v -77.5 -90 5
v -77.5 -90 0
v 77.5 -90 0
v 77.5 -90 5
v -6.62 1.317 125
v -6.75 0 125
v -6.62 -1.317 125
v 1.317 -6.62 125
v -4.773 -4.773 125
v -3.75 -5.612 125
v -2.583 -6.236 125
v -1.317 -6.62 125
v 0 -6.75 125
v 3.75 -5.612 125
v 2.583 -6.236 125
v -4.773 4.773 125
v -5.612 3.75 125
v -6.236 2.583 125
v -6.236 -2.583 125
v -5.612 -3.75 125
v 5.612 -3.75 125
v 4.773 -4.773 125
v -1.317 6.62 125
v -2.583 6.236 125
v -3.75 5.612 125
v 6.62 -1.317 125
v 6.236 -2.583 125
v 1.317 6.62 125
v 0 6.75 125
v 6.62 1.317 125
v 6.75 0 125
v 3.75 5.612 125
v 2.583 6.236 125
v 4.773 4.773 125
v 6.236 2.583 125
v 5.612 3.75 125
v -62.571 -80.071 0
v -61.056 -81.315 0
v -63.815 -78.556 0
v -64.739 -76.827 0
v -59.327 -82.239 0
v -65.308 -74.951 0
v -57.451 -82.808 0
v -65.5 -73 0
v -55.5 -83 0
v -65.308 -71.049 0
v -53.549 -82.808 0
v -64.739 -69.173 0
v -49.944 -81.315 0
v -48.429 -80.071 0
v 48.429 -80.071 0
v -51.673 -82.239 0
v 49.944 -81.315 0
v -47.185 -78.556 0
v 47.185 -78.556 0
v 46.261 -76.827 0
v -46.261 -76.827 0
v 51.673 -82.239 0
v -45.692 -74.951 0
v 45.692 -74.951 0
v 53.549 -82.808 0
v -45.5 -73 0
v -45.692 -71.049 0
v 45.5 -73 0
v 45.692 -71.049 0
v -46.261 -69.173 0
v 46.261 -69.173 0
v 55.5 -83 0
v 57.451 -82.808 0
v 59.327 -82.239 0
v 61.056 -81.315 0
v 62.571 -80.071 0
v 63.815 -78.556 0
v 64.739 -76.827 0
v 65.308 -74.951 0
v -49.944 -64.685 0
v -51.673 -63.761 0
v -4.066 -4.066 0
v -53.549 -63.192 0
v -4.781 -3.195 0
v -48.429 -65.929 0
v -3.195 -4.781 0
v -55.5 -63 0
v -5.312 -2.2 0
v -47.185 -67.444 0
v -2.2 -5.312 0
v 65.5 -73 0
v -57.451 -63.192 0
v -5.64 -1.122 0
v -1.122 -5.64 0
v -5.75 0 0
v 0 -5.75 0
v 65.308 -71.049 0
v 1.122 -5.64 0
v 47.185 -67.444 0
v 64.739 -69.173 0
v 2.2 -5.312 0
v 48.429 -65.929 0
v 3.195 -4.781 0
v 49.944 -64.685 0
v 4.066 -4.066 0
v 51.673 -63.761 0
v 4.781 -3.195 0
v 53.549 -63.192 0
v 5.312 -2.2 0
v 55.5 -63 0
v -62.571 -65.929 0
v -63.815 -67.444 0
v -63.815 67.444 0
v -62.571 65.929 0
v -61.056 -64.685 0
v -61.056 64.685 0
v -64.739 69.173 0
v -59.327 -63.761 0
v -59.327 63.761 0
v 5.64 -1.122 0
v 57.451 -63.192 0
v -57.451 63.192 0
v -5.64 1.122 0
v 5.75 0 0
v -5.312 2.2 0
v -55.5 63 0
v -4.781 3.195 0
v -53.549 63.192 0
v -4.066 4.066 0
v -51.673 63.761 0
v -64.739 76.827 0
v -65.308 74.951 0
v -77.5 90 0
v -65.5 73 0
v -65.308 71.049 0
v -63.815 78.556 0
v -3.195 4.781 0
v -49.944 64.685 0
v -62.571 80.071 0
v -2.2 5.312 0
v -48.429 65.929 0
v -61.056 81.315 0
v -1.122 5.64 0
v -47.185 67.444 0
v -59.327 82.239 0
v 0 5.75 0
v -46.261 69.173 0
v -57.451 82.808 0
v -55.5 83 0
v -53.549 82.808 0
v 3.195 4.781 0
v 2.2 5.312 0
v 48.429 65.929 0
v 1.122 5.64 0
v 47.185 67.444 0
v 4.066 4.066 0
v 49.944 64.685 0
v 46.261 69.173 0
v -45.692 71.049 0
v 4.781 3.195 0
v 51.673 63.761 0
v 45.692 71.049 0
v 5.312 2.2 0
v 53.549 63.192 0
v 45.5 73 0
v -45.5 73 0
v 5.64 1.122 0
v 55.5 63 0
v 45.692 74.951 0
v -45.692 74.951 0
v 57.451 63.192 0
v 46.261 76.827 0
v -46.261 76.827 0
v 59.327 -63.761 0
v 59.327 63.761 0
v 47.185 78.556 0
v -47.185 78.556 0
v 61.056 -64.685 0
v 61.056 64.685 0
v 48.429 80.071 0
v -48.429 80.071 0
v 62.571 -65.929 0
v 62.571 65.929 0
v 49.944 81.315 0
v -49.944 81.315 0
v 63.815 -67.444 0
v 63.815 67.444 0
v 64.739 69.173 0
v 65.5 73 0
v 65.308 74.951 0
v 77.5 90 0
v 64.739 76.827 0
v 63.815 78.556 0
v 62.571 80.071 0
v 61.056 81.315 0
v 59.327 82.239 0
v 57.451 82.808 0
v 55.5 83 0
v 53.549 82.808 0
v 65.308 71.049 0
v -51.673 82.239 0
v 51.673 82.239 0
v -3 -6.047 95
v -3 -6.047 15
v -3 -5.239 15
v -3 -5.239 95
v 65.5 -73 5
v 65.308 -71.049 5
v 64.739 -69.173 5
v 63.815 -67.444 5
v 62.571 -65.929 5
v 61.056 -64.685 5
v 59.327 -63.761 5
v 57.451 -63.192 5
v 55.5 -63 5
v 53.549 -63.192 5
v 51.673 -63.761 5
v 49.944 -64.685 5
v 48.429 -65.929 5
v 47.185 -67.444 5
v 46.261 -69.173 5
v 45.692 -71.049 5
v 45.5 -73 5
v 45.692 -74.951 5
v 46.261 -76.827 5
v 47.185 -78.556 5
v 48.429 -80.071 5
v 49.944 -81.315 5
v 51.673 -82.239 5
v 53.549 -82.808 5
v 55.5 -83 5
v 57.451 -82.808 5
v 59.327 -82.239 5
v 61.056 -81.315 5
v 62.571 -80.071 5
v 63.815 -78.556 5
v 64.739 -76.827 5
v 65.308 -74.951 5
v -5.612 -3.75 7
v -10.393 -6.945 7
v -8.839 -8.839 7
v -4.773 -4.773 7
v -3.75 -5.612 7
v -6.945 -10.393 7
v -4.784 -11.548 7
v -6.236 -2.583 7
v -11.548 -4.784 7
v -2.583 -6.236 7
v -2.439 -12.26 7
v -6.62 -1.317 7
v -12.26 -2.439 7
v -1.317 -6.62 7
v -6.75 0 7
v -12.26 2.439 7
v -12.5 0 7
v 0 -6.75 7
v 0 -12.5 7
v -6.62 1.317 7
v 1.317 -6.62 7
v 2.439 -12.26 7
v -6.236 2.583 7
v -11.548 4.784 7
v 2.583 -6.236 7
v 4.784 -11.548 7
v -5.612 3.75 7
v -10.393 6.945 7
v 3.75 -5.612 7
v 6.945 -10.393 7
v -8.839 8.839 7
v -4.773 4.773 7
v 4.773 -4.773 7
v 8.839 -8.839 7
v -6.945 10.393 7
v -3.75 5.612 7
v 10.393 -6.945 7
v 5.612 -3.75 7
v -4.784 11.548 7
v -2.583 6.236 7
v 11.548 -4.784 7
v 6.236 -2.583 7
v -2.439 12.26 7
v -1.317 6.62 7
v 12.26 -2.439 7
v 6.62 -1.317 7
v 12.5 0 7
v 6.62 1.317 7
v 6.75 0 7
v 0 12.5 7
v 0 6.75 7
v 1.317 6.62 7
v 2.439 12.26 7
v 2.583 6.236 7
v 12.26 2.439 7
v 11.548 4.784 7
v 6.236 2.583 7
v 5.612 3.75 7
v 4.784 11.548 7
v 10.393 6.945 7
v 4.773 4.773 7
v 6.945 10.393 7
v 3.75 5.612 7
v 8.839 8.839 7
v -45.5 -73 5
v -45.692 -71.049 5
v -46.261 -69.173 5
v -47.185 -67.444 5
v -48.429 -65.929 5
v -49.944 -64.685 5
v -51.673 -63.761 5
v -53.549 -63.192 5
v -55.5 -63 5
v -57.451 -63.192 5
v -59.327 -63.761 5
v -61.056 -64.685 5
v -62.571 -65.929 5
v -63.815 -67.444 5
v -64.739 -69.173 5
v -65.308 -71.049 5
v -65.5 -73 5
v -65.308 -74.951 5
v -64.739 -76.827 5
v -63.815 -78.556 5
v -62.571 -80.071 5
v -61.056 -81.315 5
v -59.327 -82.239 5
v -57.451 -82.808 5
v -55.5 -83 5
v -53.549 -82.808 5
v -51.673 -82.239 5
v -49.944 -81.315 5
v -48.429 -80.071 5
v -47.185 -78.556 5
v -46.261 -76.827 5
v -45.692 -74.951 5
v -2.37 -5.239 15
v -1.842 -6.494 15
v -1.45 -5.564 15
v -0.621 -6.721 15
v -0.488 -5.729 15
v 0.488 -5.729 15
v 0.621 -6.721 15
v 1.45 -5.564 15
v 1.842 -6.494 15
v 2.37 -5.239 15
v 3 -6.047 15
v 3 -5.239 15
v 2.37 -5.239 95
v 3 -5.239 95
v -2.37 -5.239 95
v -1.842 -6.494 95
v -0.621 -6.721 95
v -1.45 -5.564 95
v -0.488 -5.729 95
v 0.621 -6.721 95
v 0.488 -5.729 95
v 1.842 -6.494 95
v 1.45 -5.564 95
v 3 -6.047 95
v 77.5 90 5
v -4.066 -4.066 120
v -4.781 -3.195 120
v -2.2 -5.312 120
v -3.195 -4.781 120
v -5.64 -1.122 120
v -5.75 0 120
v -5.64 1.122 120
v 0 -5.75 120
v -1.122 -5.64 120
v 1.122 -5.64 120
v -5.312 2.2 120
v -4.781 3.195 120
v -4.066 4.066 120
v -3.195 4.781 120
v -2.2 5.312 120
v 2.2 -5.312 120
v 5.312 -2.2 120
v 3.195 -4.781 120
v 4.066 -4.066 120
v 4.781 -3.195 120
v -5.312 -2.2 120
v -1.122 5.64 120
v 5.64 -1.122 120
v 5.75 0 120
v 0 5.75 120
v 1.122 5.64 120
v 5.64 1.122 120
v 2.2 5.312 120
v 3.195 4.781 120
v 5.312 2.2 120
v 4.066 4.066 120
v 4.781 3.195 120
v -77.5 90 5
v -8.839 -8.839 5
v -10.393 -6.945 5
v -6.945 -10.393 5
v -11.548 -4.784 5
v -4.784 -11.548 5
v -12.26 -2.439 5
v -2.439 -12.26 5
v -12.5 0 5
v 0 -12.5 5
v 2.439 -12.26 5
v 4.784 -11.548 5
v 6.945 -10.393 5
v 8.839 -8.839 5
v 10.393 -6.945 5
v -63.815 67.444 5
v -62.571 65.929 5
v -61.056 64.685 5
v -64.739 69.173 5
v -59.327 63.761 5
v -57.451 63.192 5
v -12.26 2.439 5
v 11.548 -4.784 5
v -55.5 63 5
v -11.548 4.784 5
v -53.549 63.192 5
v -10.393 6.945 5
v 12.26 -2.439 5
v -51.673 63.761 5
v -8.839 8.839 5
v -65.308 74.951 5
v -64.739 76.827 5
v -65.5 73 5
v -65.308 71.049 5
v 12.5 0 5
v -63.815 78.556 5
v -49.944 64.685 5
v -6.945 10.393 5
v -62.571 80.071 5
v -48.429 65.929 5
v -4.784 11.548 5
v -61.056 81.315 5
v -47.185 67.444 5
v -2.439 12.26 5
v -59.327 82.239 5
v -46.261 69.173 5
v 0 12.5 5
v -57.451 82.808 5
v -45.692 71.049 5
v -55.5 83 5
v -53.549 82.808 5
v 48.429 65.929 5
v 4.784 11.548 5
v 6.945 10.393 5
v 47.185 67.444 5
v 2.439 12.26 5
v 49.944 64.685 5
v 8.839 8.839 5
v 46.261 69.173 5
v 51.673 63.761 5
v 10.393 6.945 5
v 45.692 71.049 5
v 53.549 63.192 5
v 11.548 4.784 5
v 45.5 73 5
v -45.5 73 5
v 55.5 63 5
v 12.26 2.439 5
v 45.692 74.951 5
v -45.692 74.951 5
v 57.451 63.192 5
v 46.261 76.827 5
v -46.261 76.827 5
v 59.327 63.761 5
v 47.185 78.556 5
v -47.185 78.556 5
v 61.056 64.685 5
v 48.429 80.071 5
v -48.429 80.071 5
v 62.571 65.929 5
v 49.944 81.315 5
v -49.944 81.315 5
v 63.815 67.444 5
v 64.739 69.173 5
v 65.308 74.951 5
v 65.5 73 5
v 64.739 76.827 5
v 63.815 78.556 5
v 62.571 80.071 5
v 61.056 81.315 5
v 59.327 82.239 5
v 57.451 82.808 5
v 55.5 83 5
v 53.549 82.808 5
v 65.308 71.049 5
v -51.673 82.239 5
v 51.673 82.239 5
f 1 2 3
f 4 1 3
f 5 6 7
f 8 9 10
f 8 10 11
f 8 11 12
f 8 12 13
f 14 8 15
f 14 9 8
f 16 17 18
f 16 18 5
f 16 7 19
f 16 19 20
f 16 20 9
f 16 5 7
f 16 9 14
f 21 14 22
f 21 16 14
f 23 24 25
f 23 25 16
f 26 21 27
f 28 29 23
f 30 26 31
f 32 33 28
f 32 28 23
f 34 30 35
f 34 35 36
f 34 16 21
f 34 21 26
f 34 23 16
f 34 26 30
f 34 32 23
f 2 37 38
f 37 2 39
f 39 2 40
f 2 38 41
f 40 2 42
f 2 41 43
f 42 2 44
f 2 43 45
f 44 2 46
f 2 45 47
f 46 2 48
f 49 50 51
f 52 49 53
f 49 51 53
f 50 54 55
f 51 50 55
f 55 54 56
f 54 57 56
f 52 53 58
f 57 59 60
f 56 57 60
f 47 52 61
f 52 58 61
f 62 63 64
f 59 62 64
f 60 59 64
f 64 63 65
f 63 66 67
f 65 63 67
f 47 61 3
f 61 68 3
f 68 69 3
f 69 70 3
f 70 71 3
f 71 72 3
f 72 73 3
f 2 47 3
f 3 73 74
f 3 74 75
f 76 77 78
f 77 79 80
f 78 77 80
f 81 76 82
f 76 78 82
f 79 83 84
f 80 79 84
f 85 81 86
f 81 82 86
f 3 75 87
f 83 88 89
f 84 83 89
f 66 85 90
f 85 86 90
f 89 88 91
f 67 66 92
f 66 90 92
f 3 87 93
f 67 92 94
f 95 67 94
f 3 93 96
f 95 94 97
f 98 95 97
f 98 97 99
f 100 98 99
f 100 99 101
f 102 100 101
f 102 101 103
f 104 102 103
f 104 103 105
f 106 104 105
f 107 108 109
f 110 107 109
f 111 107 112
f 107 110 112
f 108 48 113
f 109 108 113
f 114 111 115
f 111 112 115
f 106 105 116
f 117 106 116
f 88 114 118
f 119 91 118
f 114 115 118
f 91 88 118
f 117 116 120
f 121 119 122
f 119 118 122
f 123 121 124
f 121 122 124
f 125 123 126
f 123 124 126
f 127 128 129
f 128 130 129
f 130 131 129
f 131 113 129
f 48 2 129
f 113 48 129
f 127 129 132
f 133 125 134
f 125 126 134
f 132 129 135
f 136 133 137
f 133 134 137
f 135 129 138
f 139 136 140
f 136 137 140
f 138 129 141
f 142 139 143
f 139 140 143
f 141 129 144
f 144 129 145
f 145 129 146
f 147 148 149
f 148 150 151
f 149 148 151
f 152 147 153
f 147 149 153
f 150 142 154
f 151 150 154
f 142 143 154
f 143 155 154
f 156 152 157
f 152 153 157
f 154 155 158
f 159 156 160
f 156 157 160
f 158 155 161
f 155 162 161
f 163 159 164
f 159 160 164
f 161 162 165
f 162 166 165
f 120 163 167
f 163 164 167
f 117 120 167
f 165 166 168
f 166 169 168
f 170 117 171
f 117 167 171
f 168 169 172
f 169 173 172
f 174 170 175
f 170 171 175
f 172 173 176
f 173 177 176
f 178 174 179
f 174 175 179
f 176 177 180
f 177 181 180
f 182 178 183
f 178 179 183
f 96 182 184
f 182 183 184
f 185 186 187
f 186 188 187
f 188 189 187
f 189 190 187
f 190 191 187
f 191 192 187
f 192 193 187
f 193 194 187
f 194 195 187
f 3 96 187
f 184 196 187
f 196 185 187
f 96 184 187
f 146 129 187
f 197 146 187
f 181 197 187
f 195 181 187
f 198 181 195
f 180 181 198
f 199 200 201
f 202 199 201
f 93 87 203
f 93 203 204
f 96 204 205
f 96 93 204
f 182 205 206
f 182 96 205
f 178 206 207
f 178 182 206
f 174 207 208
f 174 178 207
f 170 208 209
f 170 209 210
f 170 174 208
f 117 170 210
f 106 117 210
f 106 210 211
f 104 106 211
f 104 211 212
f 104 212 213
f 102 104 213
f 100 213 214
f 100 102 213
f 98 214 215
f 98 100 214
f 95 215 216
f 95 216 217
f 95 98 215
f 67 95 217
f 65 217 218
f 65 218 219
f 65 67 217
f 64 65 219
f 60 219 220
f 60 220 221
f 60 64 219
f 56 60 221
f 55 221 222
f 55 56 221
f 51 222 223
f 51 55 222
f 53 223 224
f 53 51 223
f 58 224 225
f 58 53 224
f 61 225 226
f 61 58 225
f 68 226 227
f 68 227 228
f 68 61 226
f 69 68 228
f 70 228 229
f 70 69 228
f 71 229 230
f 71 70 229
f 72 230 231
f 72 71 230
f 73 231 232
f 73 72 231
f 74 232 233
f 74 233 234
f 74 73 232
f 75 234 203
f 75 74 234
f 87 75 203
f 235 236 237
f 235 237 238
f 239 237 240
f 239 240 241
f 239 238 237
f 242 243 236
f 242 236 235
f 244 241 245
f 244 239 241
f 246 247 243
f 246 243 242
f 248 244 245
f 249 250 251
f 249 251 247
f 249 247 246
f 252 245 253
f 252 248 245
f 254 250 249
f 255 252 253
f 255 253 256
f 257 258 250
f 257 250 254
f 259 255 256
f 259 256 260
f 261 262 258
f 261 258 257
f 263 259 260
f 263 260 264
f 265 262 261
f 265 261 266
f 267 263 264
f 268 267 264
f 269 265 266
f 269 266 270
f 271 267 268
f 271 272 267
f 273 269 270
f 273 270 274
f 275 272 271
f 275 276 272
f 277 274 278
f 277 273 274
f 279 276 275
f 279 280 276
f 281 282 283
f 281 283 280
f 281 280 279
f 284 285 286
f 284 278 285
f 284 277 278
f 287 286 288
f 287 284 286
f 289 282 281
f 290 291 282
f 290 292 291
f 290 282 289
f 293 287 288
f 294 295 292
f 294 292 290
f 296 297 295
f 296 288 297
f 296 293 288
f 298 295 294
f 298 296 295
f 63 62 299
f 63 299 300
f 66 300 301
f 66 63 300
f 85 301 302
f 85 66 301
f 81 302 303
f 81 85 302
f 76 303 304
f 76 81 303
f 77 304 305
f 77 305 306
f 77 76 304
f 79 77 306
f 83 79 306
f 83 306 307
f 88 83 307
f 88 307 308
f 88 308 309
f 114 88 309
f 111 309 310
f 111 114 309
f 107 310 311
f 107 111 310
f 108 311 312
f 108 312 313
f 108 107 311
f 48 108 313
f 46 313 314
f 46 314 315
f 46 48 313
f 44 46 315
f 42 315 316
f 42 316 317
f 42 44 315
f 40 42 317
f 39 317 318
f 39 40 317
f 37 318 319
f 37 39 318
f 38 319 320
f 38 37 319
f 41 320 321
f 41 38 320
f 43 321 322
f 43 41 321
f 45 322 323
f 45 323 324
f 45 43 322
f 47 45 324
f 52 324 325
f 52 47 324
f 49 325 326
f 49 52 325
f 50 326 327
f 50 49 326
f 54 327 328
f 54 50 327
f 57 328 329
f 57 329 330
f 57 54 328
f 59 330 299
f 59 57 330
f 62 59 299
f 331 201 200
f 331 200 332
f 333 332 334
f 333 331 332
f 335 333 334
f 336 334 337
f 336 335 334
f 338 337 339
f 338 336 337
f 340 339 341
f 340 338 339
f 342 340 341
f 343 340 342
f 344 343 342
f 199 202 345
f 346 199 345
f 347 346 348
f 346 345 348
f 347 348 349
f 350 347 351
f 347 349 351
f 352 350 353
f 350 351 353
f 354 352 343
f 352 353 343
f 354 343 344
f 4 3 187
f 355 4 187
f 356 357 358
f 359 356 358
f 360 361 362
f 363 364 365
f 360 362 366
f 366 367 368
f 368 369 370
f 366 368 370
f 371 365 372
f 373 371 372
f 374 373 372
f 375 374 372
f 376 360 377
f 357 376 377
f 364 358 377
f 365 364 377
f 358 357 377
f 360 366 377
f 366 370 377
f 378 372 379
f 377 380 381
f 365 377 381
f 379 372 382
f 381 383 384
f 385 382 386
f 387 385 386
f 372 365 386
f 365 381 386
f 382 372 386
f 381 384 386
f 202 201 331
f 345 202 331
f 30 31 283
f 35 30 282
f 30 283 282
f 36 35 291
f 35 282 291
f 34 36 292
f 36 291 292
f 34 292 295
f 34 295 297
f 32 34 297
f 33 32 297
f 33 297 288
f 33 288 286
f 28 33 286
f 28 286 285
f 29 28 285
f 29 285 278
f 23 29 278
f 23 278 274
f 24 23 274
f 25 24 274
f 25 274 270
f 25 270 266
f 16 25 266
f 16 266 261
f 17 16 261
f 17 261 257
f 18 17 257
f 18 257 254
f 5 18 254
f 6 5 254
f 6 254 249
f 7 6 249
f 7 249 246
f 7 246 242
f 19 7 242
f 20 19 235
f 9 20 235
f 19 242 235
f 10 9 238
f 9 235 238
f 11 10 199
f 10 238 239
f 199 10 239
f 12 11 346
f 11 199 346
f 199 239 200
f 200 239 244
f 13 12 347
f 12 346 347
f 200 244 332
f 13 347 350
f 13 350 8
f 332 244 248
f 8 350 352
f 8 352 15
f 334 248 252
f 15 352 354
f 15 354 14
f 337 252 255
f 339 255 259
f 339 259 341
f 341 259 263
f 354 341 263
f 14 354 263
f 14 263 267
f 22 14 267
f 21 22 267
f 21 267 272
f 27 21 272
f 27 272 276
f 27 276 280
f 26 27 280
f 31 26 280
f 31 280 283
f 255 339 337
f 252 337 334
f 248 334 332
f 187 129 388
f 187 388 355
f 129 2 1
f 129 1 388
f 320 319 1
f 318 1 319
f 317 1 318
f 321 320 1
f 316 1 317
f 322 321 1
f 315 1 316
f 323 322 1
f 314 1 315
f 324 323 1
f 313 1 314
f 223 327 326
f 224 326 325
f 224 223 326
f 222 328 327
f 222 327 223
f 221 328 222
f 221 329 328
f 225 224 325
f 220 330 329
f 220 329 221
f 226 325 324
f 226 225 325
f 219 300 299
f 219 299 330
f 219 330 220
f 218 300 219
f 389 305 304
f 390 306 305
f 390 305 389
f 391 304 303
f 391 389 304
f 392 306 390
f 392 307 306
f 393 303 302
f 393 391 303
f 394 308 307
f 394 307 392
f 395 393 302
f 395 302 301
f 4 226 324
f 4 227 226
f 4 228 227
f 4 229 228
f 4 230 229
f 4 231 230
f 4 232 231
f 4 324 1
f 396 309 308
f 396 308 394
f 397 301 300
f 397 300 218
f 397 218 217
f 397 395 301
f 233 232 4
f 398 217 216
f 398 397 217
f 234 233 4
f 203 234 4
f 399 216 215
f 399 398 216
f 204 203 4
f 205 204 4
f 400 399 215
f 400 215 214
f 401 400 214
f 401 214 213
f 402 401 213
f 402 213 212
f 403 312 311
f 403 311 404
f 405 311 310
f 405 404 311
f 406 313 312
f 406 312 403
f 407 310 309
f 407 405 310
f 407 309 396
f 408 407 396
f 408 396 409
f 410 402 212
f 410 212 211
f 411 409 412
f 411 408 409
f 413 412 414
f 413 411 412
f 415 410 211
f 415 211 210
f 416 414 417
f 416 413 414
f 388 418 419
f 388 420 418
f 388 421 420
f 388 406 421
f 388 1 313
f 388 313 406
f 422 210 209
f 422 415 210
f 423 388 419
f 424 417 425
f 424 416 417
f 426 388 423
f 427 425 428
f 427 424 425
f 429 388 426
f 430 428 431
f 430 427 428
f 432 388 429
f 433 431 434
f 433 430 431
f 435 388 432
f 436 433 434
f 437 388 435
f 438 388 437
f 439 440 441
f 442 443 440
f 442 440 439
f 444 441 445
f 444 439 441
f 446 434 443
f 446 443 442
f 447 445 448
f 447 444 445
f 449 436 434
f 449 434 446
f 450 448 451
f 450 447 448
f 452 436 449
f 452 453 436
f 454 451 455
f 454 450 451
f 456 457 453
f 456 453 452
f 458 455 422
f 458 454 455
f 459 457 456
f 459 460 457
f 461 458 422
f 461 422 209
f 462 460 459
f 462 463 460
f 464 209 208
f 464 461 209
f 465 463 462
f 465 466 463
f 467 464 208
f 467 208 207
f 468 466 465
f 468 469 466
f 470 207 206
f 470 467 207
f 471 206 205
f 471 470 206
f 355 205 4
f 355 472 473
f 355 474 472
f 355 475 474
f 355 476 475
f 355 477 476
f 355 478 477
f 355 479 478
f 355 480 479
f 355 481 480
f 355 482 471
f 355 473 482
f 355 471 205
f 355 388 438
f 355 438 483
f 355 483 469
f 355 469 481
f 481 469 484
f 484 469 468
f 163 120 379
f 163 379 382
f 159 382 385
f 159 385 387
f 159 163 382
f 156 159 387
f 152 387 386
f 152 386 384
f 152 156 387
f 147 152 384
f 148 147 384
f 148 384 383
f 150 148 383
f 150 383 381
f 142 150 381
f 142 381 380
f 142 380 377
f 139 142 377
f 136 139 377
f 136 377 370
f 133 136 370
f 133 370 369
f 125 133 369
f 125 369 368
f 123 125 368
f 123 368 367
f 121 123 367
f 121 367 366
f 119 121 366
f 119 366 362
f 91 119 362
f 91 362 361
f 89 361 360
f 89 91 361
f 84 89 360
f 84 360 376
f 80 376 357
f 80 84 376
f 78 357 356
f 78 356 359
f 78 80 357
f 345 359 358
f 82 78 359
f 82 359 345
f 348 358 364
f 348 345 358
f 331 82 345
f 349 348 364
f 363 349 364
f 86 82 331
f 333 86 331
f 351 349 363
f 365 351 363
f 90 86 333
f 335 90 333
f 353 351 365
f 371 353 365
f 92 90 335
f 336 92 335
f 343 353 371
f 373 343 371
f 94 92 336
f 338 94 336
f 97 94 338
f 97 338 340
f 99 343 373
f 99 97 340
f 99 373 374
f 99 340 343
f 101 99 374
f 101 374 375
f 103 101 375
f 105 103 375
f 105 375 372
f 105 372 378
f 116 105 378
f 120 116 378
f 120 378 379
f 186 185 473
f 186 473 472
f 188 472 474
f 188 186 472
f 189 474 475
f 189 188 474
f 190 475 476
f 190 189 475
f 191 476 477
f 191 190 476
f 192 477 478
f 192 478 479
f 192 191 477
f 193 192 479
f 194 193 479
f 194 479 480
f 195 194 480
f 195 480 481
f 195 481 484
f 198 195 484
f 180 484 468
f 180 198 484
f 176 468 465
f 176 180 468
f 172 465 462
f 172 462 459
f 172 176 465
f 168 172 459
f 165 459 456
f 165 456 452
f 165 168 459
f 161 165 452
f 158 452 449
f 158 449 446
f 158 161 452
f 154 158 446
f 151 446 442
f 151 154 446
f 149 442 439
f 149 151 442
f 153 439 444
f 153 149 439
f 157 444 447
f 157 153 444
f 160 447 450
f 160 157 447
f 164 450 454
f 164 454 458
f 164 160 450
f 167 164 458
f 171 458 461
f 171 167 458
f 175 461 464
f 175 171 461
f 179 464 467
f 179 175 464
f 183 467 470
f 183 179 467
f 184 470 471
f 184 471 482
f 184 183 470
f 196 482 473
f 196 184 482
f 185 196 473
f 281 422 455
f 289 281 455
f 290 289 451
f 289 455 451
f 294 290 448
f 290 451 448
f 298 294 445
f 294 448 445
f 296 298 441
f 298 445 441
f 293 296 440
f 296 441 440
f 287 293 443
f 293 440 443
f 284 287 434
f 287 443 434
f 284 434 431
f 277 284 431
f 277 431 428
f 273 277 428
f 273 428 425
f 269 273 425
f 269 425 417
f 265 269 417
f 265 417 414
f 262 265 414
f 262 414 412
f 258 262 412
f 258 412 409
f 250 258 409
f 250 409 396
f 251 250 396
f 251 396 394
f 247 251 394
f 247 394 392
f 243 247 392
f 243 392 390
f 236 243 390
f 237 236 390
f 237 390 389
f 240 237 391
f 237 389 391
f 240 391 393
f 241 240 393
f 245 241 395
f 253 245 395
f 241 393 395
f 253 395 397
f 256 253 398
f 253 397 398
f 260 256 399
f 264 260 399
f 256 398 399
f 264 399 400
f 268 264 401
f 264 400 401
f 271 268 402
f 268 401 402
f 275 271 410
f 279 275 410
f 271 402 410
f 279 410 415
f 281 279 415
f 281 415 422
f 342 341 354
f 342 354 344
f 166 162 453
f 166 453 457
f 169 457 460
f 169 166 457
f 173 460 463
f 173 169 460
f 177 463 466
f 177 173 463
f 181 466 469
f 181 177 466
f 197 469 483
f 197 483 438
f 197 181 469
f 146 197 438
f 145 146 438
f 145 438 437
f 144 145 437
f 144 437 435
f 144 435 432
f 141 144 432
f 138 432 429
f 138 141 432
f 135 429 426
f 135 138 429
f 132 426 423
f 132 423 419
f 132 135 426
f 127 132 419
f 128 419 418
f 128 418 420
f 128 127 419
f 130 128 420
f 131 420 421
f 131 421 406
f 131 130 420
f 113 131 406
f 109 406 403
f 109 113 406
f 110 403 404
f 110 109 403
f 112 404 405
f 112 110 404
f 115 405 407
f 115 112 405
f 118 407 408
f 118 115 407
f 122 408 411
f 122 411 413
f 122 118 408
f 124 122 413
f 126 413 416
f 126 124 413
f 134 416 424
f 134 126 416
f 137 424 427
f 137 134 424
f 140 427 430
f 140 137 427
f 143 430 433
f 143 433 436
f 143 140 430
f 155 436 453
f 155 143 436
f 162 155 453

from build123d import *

# Parameters (mm, degrees)
SKETCH1_W           = 155
SKETCH1_H           = 180
SKETCH1_R           = 10
SKETCH1_R_2         = 12.5
BOSS_EXTRUDE1_DEPTH = 5
SKETCH1_3_R         = 12.5
SKETCH1_3_R_2       = 6.75
BOSS_EXTRUDE2_DEPTH = 7
SKETCH1_4_R         = 6.75
BOSS_EXTRUDE3_DEPTH = 125
SKETCH1_5_R         = 5.75
CUT_EXTRUDE1_DEPTH  = 120
SKETCH2_W           = 6
SKETCH2_H           = 3.022470888
CUT_EXTRUDE2_DEPTH  = 80


with BuildPart() as part:
    # Sketch1 → Boss-Extrude1 (new body)
    with BuildSketch(Plane.XY):
        Rectangle(SKETCH1_W, SKETCH1_H)
        with Locations((-55.5, -73)):
            Circle(SKETCH1_R, mode=Mode.SUBTRACT)
        with Locations((55.5, -73)):
            Circle(SKETCH1_R, mode=Mode.SUBTRACT)
        Circle(SKETCH1_R_2, mode=Mode.SUBTRACT)
        with Locations((-55.5, 73)):
            Circle(SKETCH1_R, mode=Mode.SUBTRACT)
        with Locations((55.5, 73)):
            Circle(SKETCH1_R, mode=Mode.SUBTRACT)
    extrude(amount=BOSS_EXTRUDE1_DEPTH)

    # Sketch1<3> → Boss-Extrude2 (add)
    with BuildSketch(Plane.XY):
        Circle(SKETCH1_3_R)
        Circle(SKETCH1_3_R_2, mode=Mode.SUBTRACT)
    extrude(amount=BOSS_EXTRUDE2_DEPTH)

    # Sketch1<4> → Boss-Extrude3 (add)
    with BuildSketch(Plane.XY):
        Circle(SKETCH1_4_R)
    extrude(amount=BOSS_EXTRUDE3_DEPTH)

    # Sketch1<5> → Cut-Extrude1 (cut)
    with BuildSketch(Plane.XY):
        Circle(SKETCH1_5_R)
    extrude(amount=CUT_EXTRUDE1_DEPTH, mode=Mode.SUBTRACT)

    # Sketch2 → Cut-Extrude2 (cut)
    with BuildSketch(Plane.XY.offset(15)):
        with Locations((0, -6.75)):
            Rectangle(SKETCH2_W, SKETCH2_H)
    extrude(amount=CUT_EXTRUDE2_DEPTH, mode=Mode.SUBTRACT)


solid = part.part
